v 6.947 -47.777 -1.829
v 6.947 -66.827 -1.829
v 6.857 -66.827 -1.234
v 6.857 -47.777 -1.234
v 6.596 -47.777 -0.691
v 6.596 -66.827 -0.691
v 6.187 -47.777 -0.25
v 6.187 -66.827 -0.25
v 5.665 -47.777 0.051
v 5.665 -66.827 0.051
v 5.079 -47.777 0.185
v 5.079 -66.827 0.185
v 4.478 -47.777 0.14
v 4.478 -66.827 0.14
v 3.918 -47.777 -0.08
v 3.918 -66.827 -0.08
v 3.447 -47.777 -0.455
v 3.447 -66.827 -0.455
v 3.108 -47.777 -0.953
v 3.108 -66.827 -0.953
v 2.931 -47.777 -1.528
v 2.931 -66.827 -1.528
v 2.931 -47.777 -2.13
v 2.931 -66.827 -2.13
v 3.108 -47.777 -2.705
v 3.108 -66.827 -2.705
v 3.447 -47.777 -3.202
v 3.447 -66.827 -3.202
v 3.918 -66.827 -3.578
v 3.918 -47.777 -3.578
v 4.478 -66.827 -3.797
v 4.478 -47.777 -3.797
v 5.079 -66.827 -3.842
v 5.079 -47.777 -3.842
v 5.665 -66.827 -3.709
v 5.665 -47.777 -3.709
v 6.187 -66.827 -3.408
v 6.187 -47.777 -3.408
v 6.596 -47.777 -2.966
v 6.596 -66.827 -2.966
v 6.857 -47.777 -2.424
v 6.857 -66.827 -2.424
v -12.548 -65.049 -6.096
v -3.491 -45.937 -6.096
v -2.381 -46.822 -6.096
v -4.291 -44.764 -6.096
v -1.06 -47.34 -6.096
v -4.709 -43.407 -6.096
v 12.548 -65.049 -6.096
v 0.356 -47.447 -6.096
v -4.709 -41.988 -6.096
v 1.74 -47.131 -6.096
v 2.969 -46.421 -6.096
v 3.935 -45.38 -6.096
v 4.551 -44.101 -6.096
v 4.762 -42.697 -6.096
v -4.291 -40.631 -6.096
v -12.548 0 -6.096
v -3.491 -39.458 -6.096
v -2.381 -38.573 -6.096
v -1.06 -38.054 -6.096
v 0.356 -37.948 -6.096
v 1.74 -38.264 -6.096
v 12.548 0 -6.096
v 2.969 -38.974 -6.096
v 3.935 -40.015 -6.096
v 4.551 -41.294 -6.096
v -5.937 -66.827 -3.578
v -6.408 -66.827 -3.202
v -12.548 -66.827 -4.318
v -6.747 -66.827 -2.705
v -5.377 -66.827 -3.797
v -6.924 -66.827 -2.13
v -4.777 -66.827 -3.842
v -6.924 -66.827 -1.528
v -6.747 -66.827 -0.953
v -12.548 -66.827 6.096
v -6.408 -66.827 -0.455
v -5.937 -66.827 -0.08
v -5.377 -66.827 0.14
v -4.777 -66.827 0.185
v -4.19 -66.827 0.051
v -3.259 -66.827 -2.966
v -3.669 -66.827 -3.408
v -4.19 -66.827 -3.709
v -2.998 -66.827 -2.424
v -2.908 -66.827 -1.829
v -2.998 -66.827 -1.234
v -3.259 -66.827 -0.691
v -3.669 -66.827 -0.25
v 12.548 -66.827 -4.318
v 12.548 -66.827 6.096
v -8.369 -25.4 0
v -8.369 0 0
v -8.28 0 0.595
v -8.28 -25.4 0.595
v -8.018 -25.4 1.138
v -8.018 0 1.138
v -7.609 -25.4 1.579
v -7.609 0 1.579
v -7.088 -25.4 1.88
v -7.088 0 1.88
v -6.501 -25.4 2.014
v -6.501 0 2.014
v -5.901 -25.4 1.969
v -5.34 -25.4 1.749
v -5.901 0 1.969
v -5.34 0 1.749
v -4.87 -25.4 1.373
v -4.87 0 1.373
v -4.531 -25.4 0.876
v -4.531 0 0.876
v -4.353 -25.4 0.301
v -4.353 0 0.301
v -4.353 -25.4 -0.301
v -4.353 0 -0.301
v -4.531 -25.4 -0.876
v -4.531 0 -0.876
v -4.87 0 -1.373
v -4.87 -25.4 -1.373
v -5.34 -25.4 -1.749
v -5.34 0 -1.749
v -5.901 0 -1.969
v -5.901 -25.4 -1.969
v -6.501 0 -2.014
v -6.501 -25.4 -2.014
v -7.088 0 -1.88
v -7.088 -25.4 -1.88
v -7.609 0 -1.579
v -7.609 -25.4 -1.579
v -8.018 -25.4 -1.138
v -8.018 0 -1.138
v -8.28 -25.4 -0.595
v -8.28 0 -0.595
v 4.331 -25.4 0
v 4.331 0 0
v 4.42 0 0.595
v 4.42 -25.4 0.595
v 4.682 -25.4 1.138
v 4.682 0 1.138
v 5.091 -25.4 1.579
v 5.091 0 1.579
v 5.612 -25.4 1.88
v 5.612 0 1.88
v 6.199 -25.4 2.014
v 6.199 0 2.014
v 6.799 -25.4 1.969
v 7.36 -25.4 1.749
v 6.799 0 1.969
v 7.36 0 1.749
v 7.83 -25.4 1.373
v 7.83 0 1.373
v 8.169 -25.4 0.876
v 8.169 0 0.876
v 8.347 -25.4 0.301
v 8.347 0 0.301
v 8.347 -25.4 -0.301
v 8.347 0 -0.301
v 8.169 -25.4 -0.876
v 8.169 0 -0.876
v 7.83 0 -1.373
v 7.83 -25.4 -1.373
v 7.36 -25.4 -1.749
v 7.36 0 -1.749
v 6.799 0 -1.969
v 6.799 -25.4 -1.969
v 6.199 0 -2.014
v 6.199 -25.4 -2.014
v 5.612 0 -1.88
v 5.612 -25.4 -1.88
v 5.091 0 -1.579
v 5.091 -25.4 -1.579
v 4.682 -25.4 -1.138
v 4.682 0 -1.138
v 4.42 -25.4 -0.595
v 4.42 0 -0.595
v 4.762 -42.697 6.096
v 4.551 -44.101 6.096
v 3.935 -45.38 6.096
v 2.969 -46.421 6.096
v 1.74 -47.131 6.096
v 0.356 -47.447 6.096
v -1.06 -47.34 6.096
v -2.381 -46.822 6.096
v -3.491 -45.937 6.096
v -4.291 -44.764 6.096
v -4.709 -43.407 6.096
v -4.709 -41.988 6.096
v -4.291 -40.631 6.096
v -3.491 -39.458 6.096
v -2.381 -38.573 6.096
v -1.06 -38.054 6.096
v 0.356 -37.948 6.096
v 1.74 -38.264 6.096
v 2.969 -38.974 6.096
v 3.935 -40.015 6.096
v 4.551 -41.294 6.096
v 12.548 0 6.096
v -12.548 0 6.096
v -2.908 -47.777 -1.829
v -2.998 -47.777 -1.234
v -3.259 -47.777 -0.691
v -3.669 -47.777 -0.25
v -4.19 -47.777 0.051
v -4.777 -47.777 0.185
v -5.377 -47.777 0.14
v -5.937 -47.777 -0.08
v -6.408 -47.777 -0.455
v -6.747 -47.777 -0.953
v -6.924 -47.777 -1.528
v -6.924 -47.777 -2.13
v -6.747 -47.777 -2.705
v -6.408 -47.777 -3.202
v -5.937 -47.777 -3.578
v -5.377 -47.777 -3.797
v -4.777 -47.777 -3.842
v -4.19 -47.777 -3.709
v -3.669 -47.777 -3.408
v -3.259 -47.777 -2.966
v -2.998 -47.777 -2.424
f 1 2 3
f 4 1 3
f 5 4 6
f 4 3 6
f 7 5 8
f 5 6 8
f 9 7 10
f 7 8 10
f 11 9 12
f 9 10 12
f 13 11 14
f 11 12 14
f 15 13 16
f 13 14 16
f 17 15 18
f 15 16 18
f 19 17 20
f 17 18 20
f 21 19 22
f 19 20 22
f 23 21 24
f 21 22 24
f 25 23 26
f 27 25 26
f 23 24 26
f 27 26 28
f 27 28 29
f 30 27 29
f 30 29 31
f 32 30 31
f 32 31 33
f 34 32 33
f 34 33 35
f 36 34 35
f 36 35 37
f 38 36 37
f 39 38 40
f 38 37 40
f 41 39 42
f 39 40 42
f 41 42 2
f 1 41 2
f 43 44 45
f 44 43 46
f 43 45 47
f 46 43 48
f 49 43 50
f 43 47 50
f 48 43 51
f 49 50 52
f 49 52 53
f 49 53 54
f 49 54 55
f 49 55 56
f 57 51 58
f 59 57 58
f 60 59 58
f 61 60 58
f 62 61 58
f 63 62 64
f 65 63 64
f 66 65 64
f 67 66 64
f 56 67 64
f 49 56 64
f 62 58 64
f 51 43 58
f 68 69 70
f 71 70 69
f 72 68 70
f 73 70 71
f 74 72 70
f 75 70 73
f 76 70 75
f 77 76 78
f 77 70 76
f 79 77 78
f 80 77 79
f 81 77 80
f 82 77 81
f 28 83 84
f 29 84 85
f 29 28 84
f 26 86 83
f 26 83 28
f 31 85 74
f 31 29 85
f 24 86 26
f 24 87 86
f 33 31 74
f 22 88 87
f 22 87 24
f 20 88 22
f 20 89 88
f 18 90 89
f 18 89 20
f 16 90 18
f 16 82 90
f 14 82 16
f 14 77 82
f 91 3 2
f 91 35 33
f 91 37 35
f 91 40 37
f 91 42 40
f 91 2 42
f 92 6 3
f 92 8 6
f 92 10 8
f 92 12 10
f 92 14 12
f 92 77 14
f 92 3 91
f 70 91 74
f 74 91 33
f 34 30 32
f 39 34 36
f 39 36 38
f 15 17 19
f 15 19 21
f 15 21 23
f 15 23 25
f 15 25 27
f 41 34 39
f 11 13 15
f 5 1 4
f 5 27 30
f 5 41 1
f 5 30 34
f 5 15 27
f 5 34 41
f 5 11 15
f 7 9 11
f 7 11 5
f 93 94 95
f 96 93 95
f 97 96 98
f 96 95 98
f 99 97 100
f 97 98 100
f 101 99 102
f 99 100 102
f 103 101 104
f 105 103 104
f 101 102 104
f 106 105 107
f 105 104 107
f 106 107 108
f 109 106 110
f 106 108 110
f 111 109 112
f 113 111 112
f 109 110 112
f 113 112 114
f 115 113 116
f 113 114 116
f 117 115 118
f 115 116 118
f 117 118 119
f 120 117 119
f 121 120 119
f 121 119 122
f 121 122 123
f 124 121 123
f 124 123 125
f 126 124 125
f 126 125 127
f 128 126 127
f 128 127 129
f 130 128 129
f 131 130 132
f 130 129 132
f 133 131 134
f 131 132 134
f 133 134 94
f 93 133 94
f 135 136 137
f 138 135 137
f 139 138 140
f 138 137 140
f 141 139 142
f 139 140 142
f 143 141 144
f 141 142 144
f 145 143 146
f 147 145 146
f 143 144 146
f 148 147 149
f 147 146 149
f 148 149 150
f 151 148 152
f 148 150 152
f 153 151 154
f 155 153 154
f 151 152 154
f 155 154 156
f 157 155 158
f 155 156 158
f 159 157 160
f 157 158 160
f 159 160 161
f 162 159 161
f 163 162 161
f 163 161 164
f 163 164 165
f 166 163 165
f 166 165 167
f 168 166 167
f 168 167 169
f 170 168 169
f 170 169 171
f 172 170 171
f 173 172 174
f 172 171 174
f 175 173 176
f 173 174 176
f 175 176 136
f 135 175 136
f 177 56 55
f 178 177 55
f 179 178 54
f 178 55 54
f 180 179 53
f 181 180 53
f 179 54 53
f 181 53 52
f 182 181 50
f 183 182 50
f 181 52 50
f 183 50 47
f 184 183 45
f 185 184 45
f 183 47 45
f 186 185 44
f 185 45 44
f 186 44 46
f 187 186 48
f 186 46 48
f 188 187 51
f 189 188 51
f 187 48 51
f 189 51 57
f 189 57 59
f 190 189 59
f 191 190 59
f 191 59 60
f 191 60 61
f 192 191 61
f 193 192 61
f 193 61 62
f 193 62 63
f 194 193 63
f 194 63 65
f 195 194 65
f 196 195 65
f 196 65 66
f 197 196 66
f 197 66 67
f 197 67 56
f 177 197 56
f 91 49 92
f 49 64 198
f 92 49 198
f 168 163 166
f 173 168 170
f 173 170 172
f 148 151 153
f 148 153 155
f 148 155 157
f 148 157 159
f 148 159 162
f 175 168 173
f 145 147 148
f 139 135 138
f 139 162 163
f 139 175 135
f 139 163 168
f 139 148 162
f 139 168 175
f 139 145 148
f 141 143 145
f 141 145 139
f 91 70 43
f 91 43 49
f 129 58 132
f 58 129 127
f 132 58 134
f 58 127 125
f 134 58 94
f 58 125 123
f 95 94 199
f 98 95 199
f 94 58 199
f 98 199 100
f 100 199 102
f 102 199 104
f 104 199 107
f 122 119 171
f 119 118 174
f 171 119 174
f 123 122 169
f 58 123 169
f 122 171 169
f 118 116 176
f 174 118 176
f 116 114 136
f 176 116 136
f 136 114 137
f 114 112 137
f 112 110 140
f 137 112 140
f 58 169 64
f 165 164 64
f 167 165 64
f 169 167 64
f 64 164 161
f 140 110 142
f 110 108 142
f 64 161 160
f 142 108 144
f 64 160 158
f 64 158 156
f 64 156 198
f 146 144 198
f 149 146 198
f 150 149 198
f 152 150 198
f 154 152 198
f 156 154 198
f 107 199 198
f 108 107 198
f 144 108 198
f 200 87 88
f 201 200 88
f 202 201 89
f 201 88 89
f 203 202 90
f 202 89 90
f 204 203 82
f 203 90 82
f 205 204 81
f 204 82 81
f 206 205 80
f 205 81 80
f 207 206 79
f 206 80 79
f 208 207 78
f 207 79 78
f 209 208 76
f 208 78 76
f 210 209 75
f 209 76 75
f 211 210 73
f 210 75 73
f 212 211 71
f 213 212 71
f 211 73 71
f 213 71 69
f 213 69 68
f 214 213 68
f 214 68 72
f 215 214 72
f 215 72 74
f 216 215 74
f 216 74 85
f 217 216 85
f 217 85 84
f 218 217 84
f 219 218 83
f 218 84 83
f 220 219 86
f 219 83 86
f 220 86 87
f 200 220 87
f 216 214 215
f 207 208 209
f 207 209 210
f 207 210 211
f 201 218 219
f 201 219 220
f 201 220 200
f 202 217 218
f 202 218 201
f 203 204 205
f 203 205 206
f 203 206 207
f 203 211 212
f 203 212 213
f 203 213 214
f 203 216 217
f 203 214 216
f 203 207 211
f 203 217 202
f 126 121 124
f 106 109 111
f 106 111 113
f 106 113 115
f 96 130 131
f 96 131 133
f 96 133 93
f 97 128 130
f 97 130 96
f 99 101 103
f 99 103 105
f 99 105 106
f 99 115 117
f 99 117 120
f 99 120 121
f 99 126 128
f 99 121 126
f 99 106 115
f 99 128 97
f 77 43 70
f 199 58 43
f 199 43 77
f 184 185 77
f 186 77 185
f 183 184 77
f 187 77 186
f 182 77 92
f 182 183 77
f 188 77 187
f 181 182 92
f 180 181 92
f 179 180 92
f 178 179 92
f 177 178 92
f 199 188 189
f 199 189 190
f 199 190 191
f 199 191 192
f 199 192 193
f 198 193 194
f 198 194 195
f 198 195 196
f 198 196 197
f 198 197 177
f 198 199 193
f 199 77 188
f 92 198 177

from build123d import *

# Parameters (mm, degrees)
F0_W     = 25.0952
F0_H     = 12.192
F1_DEPTH = 66.8274
F2_R     = 2.0193
F3_DEPTH = 25.4
F4_R     = 2.0193
F5_DEPTH = 19.05
F6_SIZE  = 1.778
F7_R     = 4.7625
F8_DEPTH = 12.193


with BuildPart() as f1:
    # F0 (on Front) → F1 (new body)
    with BuildSketch(Plane.XZ):
        Rectangle(F0_W, F0_H)
    extrude(amount=F1_DEPTH)

    # F2 (on face) → F3 (cut)
    with BuildSketch(Plane(origin=(0, 0, 0), x_dir=(-1, 0, 0), z_dir=(0, 1, 0))):
        with Locations((6.35, 0)):
            Circle(F2_R)
        with Locations((-6.35, 0)):
            Circle(F2_R)
    extrude(amount=-F3_DEPTH, mode=Mode.SUBTRACT)

    # F4 (on face) → F5 (cut)
    with BuildSketch(Plane.XZ.offset(66.8274)):
        with Locations((-4.9276, -1.8288)):
            Circle(F4_R)
        with Locations((4.9276, -1.8288)):
            Circle(F4_R)
    extrude(amount=-F5_DEPTH, mode=Mode.SUBTRACT)

    # F6
    f6_edges = [f1.edges().sort_by_distance(p)[0] for p in [
        (0, -66.8274, -6.096),
    ]]
    chamfer(f6_edges, length=F6_SIZE)

    # F7 (on face) → F8 (cut, through all)
    with BuildSketch(Plane(origin=(0, 0, -6.096), x_dir=(1, 0, 0), z_dir=(0, 0, -1))):
        with Locations((0, 42.6974)):
            Circle(F7_R)
    extrude(amount=-F8_DEPTH, mode=Mode.SUBTRACT)


solid = f1.part
